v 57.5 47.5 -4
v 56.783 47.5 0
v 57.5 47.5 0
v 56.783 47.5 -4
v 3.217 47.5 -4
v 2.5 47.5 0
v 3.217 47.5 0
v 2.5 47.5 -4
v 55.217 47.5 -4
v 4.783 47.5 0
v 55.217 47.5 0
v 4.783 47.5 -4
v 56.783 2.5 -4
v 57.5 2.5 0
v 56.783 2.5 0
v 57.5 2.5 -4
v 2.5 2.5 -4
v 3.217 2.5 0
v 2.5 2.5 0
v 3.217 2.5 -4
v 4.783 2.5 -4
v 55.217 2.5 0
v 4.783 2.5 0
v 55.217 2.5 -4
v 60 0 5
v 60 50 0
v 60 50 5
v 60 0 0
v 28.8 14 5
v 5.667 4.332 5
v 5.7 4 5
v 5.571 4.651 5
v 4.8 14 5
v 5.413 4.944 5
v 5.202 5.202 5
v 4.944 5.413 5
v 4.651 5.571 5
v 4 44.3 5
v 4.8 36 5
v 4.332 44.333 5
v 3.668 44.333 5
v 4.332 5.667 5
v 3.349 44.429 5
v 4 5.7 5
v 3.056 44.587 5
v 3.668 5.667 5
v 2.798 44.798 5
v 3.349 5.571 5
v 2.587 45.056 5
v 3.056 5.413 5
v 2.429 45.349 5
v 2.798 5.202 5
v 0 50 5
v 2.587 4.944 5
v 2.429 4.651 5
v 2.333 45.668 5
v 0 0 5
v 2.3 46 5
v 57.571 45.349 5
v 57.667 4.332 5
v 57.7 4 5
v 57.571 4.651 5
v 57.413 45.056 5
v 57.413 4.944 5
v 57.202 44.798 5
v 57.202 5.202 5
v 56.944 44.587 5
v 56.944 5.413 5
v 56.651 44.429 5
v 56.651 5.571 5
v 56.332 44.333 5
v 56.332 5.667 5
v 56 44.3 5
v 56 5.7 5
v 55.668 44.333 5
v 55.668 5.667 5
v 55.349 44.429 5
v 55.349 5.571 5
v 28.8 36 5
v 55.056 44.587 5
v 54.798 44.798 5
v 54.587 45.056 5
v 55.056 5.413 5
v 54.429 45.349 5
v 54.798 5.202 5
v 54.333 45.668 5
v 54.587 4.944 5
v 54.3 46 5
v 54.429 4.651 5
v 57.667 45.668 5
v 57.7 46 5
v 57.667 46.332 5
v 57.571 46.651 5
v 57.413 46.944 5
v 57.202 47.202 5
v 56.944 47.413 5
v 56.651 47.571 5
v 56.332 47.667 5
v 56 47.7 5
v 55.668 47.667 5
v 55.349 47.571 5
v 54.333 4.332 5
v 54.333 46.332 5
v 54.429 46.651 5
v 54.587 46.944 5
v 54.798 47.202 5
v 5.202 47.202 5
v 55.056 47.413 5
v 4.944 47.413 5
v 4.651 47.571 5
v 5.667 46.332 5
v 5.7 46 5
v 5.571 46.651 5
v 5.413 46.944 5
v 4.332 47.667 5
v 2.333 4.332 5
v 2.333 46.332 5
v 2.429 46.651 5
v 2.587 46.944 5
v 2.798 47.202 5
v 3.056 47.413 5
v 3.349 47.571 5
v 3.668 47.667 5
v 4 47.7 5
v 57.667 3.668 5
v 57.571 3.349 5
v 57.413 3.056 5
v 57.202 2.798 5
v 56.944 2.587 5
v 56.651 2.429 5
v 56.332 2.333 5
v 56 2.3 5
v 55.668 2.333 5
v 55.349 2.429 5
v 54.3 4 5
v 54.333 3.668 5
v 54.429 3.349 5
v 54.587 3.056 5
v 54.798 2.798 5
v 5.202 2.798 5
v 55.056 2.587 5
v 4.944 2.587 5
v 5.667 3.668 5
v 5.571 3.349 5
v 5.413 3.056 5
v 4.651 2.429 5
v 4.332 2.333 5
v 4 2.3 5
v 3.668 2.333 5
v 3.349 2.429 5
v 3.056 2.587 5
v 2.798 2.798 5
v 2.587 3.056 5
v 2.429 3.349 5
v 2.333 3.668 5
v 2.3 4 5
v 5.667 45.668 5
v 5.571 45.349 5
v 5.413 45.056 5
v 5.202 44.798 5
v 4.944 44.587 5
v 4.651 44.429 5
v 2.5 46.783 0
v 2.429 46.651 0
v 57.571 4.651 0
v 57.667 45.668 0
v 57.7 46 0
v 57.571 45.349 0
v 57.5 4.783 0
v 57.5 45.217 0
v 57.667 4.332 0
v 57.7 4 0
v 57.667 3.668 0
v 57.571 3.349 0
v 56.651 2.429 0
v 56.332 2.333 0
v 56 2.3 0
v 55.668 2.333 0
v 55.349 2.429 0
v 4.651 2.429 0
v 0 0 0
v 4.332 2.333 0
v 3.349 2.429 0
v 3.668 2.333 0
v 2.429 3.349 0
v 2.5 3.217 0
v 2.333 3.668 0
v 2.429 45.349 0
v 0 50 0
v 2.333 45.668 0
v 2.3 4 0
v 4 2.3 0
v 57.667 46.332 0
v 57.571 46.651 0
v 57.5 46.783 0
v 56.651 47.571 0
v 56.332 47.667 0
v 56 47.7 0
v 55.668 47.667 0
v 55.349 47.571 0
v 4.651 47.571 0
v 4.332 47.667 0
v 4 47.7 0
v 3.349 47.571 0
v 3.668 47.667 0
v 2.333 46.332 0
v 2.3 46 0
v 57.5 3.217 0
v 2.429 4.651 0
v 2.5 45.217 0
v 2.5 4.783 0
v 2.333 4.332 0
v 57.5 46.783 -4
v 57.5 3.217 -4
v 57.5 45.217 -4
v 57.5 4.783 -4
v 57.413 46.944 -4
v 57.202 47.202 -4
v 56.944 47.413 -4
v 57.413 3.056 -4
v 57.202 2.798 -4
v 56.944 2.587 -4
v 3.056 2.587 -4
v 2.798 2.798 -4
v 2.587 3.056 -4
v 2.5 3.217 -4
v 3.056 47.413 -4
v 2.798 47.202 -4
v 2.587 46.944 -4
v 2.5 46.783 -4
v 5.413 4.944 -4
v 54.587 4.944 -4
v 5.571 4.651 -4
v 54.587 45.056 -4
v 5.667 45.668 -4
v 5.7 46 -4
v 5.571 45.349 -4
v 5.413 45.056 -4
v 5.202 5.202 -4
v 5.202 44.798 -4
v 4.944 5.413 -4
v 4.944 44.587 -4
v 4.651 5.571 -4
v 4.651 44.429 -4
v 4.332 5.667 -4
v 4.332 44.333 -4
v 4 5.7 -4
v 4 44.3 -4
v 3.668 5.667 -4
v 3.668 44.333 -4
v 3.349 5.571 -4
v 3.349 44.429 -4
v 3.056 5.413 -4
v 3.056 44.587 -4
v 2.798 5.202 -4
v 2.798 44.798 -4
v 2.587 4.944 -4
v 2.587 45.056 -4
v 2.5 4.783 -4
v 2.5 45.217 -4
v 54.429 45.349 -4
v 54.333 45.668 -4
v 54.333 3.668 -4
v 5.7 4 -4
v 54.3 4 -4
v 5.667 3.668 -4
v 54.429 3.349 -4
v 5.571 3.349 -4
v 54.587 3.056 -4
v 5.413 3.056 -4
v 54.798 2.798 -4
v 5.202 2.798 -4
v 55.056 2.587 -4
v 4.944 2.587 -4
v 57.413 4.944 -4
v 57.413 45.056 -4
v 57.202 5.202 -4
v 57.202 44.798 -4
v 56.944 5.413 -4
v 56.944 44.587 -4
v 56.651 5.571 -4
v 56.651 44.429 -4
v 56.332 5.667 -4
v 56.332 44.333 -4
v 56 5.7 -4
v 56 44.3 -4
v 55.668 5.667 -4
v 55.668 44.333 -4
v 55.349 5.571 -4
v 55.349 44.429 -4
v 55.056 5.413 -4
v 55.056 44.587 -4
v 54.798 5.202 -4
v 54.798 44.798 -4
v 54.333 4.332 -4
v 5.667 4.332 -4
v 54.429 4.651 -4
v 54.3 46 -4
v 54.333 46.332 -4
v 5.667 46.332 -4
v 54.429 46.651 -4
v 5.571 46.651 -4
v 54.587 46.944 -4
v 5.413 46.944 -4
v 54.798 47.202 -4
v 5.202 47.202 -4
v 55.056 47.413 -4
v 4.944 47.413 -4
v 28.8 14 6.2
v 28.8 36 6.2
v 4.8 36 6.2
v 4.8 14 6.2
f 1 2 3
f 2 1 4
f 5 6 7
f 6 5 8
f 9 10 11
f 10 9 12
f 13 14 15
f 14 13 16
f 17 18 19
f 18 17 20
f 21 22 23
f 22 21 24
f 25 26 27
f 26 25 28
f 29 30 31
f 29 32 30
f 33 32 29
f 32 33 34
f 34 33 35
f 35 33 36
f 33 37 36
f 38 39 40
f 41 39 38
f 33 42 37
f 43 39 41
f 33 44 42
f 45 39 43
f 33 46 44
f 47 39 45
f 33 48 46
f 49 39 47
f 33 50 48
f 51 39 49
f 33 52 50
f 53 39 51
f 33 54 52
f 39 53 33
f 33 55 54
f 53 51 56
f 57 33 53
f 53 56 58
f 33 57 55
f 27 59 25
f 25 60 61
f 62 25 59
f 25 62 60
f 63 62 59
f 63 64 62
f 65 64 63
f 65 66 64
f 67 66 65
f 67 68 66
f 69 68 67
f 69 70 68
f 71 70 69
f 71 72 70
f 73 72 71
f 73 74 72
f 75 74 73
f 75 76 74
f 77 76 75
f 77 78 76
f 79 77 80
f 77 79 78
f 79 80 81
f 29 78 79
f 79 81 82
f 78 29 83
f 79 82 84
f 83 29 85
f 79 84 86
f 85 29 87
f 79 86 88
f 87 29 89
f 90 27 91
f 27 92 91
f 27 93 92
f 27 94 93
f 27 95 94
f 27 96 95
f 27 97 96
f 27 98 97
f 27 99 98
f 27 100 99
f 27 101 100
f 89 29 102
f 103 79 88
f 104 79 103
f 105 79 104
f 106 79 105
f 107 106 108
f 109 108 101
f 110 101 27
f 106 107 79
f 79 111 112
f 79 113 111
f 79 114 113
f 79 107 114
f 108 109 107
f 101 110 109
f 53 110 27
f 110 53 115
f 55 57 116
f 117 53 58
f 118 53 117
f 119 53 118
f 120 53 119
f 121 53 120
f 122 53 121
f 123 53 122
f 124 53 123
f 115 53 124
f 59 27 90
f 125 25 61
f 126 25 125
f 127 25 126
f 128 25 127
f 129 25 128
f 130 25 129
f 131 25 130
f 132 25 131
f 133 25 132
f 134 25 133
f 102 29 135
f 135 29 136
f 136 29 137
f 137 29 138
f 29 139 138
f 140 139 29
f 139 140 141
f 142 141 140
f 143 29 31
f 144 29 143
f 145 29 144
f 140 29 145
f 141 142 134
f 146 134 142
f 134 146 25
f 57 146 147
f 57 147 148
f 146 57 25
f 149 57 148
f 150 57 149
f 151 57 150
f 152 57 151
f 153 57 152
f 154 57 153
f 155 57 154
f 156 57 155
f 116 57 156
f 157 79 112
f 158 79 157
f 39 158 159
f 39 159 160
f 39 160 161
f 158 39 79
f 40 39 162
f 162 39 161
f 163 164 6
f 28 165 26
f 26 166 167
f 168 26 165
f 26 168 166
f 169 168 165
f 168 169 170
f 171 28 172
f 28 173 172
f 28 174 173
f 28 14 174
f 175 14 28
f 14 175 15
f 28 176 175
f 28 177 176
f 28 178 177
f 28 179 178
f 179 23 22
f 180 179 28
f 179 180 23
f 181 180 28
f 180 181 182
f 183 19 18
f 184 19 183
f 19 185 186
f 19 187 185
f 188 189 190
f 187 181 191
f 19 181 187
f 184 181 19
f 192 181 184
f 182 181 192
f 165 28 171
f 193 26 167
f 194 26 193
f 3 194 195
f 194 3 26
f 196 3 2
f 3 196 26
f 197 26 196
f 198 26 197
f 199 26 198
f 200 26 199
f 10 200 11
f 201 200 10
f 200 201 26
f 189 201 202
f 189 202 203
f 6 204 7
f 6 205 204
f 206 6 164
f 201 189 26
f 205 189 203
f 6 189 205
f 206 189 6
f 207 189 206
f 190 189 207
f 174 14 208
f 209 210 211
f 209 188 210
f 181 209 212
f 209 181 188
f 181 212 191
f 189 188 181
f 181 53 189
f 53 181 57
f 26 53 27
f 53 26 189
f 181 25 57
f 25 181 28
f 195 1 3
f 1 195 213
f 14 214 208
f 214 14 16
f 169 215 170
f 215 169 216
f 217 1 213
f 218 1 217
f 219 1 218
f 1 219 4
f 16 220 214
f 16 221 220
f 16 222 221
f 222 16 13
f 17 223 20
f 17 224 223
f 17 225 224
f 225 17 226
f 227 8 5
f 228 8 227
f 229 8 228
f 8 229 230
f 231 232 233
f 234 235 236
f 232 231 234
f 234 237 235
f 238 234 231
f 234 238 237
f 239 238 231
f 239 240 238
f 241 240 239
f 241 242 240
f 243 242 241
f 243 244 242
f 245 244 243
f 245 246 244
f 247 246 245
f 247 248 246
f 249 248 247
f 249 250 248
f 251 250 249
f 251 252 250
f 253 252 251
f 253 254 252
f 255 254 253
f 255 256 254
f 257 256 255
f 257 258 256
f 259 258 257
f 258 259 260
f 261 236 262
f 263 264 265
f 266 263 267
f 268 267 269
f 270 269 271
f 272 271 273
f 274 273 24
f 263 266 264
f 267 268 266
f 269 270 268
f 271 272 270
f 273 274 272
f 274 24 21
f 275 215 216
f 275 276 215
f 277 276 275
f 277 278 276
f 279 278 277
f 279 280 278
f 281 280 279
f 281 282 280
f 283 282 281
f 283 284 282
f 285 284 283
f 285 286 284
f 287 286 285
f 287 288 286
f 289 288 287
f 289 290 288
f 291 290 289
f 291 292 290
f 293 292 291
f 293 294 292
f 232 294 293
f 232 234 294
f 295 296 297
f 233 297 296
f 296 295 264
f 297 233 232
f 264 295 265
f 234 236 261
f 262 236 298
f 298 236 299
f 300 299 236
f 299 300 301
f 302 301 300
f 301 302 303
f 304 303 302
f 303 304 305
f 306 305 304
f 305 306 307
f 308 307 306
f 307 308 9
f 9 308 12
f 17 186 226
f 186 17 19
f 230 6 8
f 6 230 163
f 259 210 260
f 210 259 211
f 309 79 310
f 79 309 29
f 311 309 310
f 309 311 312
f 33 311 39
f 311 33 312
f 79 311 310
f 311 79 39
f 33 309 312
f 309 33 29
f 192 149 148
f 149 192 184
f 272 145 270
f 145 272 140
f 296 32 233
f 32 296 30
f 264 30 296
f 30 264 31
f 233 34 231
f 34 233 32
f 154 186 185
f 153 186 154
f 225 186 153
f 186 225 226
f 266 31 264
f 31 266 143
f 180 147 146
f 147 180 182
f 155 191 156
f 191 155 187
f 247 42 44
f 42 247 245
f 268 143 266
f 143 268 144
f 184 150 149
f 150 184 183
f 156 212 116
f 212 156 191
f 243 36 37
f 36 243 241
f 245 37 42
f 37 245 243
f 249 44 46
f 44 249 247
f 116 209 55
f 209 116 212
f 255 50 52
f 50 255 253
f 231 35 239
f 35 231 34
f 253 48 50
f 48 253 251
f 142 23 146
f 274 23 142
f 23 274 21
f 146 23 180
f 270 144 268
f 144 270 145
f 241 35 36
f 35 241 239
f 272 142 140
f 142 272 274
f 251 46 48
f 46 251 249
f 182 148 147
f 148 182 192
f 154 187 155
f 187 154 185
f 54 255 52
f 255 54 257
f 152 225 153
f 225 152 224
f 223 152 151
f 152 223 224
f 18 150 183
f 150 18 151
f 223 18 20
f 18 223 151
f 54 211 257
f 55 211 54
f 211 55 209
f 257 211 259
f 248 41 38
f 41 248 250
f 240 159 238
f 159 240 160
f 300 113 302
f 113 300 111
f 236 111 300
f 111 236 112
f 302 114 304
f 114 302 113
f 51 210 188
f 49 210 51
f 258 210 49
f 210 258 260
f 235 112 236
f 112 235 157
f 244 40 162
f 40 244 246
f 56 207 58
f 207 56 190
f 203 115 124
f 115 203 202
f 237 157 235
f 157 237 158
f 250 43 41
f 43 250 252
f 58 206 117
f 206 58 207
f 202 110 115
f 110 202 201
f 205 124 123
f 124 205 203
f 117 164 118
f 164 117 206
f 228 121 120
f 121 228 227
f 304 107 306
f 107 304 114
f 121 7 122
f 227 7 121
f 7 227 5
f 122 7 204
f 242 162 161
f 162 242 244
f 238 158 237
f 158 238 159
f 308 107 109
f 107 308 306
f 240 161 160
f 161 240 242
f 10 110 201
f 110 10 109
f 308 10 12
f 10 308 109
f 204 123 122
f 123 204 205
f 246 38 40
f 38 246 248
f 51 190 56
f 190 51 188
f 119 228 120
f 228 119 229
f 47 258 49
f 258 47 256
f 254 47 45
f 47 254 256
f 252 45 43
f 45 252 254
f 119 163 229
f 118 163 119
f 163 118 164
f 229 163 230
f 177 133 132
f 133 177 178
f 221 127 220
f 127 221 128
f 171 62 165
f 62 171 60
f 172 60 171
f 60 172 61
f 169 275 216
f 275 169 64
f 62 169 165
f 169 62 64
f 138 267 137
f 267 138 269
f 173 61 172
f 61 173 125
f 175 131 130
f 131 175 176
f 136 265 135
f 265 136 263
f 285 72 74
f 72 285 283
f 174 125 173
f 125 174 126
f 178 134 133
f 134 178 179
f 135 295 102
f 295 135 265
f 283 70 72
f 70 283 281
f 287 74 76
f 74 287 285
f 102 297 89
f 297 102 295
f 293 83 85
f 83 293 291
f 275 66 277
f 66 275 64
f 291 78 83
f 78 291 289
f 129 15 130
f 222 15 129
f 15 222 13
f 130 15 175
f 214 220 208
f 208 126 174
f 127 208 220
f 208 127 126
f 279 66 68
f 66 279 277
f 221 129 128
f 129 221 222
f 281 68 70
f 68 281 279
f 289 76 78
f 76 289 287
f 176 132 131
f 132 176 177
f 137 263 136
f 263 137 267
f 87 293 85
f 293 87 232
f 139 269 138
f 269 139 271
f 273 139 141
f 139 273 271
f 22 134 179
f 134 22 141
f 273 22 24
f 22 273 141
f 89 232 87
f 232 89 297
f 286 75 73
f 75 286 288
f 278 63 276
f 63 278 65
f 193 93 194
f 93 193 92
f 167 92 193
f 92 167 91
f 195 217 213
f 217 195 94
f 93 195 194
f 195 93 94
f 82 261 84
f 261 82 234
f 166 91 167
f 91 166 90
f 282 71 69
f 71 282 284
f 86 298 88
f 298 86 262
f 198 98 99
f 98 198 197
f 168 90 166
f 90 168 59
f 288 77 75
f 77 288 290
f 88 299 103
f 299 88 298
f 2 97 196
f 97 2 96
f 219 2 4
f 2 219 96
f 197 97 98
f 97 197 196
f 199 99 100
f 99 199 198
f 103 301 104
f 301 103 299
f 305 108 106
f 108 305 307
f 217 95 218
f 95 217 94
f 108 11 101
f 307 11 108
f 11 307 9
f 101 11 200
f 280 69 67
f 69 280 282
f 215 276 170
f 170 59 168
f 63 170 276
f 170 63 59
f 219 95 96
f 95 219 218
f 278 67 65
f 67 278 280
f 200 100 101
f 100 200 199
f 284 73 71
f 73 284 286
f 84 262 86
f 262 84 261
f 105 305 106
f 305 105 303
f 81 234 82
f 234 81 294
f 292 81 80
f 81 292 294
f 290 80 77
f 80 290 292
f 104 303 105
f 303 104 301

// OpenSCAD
$fn = 32;

// ----------------------------------------------------------------------
// Enclosure lid: 60 x 50 x 5 mm, 4 bolt holes
// ----------------------------------------------------------------------

// --- parameters (mm) ---
length = 60;              // lid length, X
width = 50;               // lid width, Y
plate_t = 5;              // lid plate thickness
bolt_d = 3.4;             // bolt clearance
boss_lip = 4;             // bolt hole inset from the corner
sink = 1;                 // overlap of the lip and ribs into the plate
lip_h = 5;                // lip height below the plate
lip_wall = 2.5;           // lip wall thickness
rib_n = 4;                // stiffening ribs
rib_t = 2.5;              // rib thickness
rib_h = 4;                // rib height below the plate
label_h = 1.2;            // raised marking pad

module plate() {
  cube([length, width, plate_t]);
  /* lip that drops into the housing opening, sunk into the plate */
  translate([lip_wall, lip_wall, -lip_h + sink]) cube([length - 2 * lip_wall, width - 2 * lip_wall, lip_h]);
  /* stiffening ribs under the plate */
  for (i = [1 : rib_n]) translate([length * i / (rib_n + 1) - rib_t / 2, lip_wall, -rib_h + sink]) cube([rib_t, width - 2 * lip_wall, rib_h]);
  /* raised marking pad on top, sunk 1 mm into the plate */
  translate([length * 0.08, width * 0.28, plate_t - 1]) cube([length * 0.4, width * 0.44, label_h + 1]);
}

difference() {
  plate();
  /* bolt pattern matching the corner bosses */
  for (sx = [0, 1]) for (sy = [0, 1])
    translate([sx * (length - 2 * boss_lip) + boss_lip, sy * (width - 2 * boss_lip) + boss_lip, -lip_h - 1])
      cylinder(h = plate_t + lip_h + 2, d = bolt_d);
}
